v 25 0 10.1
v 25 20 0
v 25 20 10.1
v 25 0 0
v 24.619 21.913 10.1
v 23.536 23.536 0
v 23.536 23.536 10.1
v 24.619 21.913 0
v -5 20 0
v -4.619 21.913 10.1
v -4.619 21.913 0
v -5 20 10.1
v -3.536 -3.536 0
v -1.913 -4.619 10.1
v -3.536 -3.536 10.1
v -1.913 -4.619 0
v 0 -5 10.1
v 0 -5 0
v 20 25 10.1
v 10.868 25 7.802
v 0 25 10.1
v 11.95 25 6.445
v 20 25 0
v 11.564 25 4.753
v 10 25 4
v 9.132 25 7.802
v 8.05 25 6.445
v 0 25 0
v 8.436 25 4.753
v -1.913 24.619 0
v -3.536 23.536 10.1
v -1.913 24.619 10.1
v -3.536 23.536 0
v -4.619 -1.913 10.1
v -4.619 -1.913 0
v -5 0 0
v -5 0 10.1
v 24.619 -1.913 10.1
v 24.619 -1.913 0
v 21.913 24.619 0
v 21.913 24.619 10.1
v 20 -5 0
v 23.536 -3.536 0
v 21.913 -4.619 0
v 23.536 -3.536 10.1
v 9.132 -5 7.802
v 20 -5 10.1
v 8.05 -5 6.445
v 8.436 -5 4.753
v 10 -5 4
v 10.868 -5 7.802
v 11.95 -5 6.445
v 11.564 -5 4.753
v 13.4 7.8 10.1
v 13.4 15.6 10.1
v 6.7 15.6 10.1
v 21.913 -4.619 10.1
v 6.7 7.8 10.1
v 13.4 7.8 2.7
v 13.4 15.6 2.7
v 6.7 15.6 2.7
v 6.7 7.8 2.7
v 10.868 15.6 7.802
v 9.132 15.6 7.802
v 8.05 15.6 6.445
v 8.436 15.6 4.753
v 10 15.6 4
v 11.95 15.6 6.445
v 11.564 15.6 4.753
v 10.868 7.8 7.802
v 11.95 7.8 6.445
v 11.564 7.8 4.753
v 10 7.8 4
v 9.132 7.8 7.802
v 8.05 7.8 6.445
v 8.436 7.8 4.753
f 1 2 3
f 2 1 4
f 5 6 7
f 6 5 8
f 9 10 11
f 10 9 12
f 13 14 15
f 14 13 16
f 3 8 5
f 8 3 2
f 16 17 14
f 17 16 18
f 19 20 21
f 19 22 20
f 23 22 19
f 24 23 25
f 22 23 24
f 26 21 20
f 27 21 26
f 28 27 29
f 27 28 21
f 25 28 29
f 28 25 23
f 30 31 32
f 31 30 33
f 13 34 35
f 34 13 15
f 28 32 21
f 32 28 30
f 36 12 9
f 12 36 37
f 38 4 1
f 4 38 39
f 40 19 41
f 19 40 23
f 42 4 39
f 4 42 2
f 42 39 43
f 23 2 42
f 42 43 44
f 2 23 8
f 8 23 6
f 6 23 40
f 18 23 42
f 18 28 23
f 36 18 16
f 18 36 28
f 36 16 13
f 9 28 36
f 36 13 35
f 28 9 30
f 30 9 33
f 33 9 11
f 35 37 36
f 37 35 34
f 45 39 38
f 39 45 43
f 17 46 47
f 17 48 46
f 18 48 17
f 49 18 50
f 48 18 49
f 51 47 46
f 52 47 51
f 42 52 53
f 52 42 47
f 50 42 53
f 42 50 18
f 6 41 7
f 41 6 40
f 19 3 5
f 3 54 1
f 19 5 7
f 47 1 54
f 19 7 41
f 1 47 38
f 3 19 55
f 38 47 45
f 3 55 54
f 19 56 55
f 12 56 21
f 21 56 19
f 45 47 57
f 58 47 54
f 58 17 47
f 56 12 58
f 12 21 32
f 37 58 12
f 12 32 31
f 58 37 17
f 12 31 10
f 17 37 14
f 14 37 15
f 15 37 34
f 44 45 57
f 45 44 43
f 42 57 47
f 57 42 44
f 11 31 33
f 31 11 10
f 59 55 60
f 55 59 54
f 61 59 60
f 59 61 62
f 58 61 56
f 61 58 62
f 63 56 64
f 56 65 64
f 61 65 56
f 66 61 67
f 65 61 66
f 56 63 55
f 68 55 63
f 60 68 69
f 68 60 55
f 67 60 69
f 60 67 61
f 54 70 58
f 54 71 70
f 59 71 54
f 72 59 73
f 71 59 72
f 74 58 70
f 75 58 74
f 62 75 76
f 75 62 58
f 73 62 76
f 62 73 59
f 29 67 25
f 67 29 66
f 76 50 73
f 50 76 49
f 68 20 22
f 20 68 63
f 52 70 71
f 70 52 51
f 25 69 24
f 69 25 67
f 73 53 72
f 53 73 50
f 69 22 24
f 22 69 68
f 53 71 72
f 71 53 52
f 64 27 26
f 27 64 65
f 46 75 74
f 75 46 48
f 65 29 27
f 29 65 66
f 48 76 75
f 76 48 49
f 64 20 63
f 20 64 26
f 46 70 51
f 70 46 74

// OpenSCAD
l = 30;
b = 5;
h = 10;
translate([-b,-b]) %cube([30,30,h]);

difference() {
     minkowski() {
	  cube([30 - (b*2),30-(b*2),h]);
	  cylinder(h=0.1, r=5);
     }
     h_x = 6.7;
     h_y = 7.8;
     h_z = 7.5;
     translate([h_x,h_y, h_z - (h/2) + 0.2]) cube([h_x, h_y, h_z]);
     translate([l/2 - b, 100/2, h - (2 * 2)]) rotate([90,90,0]) cylinder(h=100, r=2);
}
